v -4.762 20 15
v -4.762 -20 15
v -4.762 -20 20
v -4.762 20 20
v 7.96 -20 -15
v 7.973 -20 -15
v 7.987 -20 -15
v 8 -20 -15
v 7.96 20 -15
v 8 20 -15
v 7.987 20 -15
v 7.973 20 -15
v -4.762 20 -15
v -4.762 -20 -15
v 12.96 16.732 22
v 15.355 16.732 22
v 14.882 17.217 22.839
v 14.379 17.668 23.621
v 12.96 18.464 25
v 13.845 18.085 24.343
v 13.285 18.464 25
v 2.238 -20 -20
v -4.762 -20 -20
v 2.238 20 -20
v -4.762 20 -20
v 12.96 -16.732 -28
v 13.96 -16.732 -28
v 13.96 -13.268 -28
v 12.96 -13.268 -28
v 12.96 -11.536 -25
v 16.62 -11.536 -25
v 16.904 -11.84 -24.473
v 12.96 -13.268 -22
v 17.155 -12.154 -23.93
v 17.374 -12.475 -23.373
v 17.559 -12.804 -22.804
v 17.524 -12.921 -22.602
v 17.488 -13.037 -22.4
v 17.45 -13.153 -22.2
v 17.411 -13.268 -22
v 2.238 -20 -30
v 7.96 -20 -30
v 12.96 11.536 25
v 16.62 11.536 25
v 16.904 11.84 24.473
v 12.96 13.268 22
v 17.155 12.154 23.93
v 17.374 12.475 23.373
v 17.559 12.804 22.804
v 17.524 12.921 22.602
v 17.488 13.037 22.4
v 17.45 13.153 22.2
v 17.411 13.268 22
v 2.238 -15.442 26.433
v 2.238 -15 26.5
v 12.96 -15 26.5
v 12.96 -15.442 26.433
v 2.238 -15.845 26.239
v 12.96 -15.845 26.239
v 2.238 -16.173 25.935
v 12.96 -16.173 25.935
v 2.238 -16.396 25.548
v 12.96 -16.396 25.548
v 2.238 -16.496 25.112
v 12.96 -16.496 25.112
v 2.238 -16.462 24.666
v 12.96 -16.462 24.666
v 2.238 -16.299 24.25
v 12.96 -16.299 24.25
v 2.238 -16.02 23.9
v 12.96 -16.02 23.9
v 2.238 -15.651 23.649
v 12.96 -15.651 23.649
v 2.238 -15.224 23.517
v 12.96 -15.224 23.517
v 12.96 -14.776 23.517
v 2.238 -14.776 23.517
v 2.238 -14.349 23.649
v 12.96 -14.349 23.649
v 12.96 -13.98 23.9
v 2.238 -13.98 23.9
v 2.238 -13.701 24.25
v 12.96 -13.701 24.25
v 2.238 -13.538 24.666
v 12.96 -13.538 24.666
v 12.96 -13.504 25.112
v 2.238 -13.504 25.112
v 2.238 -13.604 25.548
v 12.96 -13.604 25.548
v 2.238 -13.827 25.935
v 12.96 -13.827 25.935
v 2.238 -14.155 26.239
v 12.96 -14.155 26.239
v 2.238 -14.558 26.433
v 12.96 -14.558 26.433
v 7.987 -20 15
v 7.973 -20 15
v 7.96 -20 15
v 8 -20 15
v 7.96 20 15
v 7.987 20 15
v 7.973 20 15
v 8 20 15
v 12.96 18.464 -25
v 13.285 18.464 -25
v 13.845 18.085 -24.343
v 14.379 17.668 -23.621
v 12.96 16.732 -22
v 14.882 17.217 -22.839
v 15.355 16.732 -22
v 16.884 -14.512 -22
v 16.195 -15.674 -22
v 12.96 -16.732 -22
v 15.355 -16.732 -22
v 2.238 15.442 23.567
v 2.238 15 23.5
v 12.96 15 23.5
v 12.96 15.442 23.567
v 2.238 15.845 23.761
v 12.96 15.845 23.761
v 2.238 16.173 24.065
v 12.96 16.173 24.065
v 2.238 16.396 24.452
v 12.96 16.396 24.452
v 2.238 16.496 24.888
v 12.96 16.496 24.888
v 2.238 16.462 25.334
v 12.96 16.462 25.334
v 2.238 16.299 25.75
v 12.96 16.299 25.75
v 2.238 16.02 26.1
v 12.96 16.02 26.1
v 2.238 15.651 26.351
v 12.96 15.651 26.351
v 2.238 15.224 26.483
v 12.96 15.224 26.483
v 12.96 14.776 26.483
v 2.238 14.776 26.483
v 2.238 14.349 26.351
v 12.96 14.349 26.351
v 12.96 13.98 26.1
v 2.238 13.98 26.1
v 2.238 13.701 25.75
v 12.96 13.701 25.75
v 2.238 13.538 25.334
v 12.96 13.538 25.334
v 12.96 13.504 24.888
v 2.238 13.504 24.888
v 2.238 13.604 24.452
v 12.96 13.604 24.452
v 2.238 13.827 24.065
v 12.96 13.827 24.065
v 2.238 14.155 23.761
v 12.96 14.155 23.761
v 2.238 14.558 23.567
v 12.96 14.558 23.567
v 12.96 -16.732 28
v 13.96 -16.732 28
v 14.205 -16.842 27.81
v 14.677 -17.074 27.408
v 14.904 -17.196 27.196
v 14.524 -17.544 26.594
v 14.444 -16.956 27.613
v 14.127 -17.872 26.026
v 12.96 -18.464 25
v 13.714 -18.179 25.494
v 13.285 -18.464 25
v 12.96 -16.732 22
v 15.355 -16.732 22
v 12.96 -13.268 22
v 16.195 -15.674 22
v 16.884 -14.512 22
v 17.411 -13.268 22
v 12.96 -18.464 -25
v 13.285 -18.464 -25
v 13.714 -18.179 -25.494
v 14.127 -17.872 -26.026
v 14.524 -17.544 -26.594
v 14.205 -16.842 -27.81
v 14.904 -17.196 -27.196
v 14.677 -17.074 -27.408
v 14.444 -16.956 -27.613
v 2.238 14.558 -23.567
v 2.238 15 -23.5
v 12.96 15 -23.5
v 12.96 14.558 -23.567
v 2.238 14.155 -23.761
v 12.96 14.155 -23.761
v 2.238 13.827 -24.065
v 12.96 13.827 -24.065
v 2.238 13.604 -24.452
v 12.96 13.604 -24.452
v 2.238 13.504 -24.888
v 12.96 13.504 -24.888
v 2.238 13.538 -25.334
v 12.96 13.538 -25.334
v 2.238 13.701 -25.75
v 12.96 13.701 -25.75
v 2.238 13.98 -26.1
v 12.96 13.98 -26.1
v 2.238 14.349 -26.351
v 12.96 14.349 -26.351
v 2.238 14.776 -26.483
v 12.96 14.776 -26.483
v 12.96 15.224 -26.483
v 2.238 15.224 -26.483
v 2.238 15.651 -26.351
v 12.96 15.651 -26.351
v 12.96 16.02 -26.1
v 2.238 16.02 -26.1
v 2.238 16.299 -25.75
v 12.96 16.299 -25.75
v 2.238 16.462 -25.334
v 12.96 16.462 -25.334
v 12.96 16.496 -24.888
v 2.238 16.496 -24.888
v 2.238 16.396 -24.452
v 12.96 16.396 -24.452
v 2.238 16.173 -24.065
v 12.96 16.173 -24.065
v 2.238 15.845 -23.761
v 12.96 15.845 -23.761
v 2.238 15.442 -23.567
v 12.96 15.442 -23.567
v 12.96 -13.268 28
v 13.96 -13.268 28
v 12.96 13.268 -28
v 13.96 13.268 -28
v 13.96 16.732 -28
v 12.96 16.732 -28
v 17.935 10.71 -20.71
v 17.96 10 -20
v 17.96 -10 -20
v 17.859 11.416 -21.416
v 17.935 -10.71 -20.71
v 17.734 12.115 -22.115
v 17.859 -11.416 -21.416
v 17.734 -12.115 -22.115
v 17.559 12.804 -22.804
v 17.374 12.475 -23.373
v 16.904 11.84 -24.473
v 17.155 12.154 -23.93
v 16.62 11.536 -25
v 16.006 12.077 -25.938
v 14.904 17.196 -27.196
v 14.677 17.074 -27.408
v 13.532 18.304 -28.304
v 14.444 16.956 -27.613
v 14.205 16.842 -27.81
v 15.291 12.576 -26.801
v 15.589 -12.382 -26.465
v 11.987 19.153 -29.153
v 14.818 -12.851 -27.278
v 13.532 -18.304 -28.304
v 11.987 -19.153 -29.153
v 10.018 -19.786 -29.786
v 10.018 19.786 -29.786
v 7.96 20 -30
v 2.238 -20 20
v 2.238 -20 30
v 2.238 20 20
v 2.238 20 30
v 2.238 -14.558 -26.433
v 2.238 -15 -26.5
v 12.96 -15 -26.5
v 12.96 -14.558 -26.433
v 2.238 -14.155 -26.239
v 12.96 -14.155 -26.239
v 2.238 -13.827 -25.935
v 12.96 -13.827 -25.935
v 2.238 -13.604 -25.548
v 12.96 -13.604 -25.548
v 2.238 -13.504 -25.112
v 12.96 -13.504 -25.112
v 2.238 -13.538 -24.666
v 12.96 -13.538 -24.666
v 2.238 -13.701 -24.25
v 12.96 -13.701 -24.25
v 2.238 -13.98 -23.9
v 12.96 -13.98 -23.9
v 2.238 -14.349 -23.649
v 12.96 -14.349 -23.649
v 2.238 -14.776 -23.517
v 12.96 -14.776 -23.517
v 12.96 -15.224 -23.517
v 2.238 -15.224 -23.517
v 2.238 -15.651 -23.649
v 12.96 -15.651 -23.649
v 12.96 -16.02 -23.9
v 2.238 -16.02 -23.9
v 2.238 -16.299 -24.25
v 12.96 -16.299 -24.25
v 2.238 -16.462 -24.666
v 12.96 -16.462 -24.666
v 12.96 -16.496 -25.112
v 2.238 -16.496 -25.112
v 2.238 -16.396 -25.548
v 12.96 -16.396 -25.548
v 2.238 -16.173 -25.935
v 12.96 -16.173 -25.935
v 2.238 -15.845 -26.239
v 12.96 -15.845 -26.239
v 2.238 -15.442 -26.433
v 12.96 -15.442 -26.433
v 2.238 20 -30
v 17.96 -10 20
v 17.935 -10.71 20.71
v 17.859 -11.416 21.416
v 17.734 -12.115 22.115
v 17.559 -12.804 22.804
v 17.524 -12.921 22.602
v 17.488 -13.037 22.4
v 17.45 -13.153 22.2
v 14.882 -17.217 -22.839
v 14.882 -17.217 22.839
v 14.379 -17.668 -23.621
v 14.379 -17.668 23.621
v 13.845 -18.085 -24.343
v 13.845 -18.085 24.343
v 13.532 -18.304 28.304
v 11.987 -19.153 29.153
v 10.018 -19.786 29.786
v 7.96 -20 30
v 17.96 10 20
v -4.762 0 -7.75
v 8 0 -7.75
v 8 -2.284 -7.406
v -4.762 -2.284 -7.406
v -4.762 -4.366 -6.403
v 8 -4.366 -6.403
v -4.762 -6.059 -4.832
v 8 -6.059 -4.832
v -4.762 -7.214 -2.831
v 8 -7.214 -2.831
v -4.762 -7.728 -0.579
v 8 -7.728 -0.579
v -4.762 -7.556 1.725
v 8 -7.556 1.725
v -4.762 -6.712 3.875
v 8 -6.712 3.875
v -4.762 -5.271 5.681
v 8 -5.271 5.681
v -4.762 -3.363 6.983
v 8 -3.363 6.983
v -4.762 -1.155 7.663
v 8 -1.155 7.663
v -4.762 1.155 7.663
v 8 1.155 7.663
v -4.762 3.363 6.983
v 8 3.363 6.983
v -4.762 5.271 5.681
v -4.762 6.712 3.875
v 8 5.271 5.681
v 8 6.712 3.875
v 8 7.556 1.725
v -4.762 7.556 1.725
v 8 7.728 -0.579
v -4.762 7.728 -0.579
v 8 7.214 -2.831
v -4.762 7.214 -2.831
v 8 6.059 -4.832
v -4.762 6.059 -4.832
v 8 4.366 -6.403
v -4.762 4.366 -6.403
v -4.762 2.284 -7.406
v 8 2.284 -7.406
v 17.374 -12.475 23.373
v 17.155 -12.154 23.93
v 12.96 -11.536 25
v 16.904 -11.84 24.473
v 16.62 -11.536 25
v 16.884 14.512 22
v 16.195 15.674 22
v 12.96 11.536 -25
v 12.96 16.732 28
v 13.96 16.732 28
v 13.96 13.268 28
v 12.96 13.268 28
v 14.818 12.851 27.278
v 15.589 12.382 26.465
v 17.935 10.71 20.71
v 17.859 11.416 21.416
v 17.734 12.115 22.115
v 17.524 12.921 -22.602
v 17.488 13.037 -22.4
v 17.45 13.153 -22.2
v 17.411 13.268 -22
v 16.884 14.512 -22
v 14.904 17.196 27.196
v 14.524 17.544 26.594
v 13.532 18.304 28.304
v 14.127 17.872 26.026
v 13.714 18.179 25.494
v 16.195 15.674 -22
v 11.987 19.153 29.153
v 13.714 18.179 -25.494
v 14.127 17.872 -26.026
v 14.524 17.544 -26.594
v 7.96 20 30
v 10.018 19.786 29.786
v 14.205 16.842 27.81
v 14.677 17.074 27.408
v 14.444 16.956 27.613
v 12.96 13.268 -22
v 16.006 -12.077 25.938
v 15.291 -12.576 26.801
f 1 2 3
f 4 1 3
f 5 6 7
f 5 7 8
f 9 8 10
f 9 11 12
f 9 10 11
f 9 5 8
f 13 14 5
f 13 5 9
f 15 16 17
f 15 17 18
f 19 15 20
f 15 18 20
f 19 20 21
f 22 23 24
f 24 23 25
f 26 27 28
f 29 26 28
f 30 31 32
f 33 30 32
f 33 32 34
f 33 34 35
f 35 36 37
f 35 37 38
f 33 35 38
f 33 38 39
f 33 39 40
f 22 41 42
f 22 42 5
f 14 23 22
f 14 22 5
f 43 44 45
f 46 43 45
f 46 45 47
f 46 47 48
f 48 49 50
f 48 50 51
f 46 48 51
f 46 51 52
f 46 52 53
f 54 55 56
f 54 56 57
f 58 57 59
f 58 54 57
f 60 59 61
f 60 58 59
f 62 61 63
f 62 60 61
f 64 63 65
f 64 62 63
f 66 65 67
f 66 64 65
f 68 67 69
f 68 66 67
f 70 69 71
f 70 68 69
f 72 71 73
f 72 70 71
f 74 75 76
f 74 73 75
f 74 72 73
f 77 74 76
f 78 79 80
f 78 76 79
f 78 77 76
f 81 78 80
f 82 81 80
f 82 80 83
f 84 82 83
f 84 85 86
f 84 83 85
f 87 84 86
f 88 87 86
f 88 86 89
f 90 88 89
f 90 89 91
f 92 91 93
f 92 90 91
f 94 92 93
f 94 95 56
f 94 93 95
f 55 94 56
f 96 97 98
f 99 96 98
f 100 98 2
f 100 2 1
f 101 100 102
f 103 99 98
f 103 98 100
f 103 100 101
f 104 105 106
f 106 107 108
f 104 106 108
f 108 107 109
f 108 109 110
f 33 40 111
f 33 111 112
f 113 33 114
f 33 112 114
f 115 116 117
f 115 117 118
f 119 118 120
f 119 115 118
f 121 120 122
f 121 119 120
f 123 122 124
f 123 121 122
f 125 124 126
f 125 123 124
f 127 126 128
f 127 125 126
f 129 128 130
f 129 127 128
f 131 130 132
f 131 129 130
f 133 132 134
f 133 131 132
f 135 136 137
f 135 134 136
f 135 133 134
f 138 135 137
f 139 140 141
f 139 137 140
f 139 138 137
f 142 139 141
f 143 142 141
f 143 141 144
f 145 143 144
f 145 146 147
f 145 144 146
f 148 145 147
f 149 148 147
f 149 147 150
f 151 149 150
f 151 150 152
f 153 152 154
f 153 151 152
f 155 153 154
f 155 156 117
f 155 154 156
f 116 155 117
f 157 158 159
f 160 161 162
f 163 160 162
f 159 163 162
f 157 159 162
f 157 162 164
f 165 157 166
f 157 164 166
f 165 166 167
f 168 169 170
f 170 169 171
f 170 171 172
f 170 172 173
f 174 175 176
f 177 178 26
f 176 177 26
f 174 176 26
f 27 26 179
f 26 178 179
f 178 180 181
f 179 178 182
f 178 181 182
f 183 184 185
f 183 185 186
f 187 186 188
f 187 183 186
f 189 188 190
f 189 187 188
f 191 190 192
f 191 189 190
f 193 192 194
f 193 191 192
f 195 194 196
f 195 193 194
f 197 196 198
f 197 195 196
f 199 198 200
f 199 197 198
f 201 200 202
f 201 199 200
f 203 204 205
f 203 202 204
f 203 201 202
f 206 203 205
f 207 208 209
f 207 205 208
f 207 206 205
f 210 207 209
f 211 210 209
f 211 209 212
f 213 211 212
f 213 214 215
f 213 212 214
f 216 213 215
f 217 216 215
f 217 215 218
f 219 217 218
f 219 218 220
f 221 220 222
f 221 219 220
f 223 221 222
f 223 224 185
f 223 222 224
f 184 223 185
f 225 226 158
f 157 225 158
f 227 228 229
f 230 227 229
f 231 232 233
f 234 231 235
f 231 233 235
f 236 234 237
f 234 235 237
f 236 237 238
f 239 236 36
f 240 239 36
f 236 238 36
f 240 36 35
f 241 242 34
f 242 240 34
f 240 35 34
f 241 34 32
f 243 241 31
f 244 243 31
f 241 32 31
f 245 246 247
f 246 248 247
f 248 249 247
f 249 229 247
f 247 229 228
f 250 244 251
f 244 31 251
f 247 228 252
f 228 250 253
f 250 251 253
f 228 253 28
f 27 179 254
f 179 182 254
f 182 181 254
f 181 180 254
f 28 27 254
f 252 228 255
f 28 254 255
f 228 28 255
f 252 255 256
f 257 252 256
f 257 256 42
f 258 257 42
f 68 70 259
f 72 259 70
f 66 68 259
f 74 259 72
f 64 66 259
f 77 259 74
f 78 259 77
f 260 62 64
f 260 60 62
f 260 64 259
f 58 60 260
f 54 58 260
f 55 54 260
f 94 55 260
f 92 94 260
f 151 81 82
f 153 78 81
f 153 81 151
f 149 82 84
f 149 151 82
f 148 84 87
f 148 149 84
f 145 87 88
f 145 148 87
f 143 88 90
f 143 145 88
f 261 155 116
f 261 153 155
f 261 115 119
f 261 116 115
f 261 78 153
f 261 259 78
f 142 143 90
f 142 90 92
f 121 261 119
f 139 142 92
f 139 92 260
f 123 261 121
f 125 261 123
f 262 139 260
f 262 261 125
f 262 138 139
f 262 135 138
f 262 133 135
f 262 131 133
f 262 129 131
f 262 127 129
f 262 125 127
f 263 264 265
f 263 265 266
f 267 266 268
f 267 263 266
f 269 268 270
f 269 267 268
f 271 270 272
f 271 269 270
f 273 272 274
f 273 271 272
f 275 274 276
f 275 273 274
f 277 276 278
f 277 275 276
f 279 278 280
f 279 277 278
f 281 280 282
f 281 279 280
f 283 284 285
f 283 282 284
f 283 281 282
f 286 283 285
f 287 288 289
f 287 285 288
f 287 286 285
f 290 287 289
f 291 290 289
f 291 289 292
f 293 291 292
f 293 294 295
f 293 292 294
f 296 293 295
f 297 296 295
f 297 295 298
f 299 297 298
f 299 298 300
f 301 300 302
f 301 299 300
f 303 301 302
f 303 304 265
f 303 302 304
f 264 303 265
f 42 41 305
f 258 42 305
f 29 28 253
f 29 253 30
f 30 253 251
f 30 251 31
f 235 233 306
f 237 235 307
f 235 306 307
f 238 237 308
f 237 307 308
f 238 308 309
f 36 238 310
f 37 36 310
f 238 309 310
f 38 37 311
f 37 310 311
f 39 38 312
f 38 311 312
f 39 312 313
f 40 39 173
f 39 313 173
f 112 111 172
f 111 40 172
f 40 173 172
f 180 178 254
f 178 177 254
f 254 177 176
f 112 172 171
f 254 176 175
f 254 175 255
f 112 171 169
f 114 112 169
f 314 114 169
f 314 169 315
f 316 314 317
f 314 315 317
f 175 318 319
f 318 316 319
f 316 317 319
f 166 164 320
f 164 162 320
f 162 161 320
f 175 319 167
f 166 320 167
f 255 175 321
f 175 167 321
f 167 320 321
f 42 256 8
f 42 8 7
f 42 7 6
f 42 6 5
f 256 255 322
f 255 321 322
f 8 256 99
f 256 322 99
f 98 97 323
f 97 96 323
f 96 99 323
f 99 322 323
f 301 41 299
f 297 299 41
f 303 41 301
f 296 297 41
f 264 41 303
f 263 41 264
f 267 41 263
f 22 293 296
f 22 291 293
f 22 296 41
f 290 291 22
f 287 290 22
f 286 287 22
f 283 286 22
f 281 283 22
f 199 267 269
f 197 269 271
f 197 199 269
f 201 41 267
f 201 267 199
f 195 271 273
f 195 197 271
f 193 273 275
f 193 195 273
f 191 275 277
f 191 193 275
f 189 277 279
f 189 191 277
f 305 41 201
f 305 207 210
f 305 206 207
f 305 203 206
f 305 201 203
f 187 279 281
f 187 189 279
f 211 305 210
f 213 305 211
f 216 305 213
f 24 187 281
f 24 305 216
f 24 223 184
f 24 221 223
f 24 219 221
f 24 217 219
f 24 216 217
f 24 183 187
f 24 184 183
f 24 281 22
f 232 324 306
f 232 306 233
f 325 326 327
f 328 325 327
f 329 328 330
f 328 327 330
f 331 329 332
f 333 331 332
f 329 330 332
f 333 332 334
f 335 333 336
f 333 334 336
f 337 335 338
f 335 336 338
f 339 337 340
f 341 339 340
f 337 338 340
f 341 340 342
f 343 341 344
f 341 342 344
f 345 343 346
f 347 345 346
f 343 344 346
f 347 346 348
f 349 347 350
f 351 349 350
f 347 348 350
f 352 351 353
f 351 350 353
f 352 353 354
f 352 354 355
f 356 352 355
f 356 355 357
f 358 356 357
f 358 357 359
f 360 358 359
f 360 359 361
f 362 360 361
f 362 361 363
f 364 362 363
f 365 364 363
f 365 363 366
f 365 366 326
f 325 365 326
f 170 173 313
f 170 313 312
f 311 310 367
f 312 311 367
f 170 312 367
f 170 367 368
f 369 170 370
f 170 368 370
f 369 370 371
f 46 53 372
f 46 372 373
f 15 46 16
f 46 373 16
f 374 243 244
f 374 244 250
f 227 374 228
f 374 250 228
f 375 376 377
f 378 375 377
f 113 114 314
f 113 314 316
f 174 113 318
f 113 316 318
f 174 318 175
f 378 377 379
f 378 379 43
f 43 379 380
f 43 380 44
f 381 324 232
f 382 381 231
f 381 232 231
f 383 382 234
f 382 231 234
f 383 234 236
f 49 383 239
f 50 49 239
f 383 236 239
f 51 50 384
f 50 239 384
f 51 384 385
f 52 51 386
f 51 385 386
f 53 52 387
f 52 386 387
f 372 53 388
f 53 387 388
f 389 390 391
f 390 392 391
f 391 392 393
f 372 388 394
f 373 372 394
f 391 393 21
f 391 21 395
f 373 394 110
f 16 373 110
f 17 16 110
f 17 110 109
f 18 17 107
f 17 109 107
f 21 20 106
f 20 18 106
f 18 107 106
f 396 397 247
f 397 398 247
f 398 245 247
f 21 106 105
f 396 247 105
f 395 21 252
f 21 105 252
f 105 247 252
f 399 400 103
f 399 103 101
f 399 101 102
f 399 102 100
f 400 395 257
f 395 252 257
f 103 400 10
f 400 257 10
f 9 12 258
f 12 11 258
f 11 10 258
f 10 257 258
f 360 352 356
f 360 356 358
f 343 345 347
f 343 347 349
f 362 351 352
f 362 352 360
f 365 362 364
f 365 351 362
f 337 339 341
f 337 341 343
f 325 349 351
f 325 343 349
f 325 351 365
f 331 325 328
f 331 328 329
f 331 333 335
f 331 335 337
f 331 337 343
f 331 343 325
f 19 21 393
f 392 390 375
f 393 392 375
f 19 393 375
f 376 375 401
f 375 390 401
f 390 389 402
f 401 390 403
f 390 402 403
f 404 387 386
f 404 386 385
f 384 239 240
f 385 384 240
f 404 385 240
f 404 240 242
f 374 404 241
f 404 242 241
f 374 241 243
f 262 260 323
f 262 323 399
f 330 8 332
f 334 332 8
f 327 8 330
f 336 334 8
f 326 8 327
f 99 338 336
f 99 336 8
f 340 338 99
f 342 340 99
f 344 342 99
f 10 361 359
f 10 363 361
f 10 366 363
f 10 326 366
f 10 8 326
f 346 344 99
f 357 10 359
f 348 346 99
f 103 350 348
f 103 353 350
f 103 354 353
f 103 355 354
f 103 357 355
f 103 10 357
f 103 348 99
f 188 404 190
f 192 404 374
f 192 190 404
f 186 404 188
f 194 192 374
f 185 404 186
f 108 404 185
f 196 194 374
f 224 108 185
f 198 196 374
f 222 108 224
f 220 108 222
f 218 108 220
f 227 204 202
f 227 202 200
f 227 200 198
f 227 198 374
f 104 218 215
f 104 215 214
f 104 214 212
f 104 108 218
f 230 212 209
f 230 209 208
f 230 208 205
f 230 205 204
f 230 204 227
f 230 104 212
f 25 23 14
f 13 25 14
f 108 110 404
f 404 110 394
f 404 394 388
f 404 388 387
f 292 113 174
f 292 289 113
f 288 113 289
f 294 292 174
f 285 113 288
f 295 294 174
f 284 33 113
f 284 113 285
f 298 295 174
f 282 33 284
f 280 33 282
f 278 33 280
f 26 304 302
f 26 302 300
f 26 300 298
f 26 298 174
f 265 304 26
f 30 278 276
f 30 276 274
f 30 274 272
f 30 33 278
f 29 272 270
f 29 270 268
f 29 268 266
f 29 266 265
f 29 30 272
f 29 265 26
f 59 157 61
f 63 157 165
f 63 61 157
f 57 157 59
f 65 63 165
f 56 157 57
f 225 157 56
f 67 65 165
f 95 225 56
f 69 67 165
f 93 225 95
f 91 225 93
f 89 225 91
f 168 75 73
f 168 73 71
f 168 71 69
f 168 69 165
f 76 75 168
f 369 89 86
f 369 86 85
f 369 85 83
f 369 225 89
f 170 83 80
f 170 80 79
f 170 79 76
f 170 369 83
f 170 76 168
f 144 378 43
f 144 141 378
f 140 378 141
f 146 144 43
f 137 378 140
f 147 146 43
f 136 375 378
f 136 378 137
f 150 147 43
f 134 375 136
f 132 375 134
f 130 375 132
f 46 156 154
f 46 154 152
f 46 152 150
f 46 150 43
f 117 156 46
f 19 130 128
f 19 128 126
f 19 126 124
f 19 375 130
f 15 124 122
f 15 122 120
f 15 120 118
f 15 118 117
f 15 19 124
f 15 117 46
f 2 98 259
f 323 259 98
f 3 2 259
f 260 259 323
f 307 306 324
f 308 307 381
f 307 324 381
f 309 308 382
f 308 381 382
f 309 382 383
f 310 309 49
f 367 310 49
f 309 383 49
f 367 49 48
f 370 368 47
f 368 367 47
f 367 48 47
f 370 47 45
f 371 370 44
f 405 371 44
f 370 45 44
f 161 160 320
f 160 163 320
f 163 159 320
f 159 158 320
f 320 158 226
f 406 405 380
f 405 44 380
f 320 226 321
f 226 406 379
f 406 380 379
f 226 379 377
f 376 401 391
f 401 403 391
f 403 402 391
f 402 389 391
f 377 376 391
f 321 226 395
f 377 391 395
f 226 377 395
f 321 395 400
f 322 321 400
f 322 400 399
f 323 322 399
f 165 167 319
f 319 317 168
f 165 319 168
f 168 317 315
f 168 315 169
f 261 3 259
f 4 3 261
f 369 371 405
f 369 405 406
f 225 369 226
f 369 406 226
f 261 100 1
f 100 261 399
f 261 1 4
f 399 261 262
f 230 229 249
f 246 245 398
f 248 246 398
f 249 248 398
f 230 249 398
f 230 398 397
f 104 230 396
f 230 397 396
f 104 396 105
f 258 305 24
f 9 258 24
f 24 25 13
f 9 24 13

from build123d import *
from build123d.topology import SkipClean

# Parameters (mm, degrees)
CROQUIS1_W              = 60
CROQUIS1_H              = 40
CROQUIS1_R              = 1.5
SALIENTE_EXTRUIR1_DEPTH = 17.96
SALIENTE_EXTRUIR2_START = 4.7625
CROQUIS3_W              = 15
CROQUIS3_H              = 40
CROQUIS3_R              = 1.5
SALIENTE_EXTRUIR2_DEPTH = 4.7625
CROQUIS4_R              = 7.75
SALIENTE_EXTRUIR3_DEPTH = 4.7625
REDONDEO2_R             = 10
CORTAR_EXTRUIR1_DEPTH   = 5
CROQUIS6_W              = 10
CROQUIS6_H              = 40
CORTAR_EXTRUIR2_DEPTH   = 7
CORTAR_EXTRUIR3_START   = -8
CROQUIS7_W              = 30
CROQUIS7_H              = 40
CROQUIS7_R              = 7.75
CORTAR_EXTRUIR3_DEPTH   = 8


with BuildPart() as part:
    # Croquis1 → Saliente-Extruir1 (new body)
    with BuildSketch(Plane(origin=(0, 0, 0), x_dir=(0, 0, -1), z_dir=(1, 0, 0))):
        Rectangle(CROQUIS1_W, CROQUIS1_H)
        with Locations((-25, 15)):
            Circle(CROQUIS1_R, mode=Mode.SUBTRACT)
        with Locations(Location((25, 15, 0), (0, 0, 180))):
            Circle(CROQUIS1_R, mode=Mode.SUBTRACT)
        with Locations((25, -15)):
            Circle(CROQUIS1_R, mode=Mode.SUBTRACT)
        with Locations(Location((-25, -15, 0), (0, 0, 180))):
            Circle(CROQUIS1_R, mode=Mode.SUBTRACT)
    extrude(amount=SALIENTE_EXTRUIR1_DEPTH)

    # Croquis3 → Saliente-Extruir2 (add)
    # profile 1 of 2: a face of its own
    with SkipClean():  # the faces are left unmerged after this step: merging them gives an invalid solid
        with BuildSketch(Plane.ZY.offset(SALIENTE_EXTRUIR2_START)):
            with Locations((-22.5, 0)):
                Rectangle(CROQUIS3_W, CROQUIS3_H)
            with Locations((-25, -15)):
                Circle(CROQUIS3_R, mode=Mode.SUBTRACT)
            with Locations((-25, 15)):
                Circle(CROQUIS3_R, mode=Mode.SUBTRACT)
        # profile 2 of 2: a face of its own
        with BuildSketch(Plane.ZY.offset(SALIENTE_EXTRUIR2_START)):
            with Locations((22.5, 0)):
                Rectangle(CROQUIS3_W, CROQUIS3_H)
            with Locations((25, -15)):
                Circle(CROQUIS3_R, mode=Mode.SUBTRACT)
            with Locations((25, 15)):
                Circle(CROQUIS3_R, mode=Mode.SUBTRACT)
        extrude(amount=-SALIENTE_EXTRUIR2_DEPTH)

    # Croquis4 → Saliente-Extruir3 (add)
    with SkipClean():  # the faces are left unmerged after this step: merging them gives an invalid solid
        with BuildSketch(Plane.ZY):
            with Locations(Location((0, 0, 0), (0, 0, 180))):
                Circle(CROQUIS4_R)
        extrude(amount=SALIENTE_EXTRUIR3_DEPTH)

    # Redondeo2
    # the kernel refuses this fillet: 10 mm, written as the material it takes off along each edge
    with BuildSketch(Plane(origin=(17.96, -45, -30), x_dir=(-1, 0, 0), z_dir=(0, 1, 0)), Plane(origin=(17.96, 45, 30), x_dir=(-1, 0, 0), z_dir=(0, -1, 0))) as redondeo2_piece_1:
        with BuildLine():
            CenterArc((REDONDEO2_R, REDONDEO2_R), REDONDEO2_R, 180, 90)
            Line((0, REDONDEO2_R), (0, 0))
            Line((0, 0), (REDONDEO2_R, 0))
        make_face()
    extrude(amount=90, mode=Mode.SUBTRACT)
    with BuildSketch(Plane(origin=(17.96, 20, -55), x_dir=(0, -1, 0), z_dir=(0, 0, 1))) as redondeo2_piece_2:
        with BuildLine():
            CenterArc((REDONDEO2_R, -REDONDEO2_R), REDONDEO2_R, 90, 90)
            Line((0, -REDONDEO2_R), (0, 0))
            Line((0, 0), (REDONDEO2_R, 0))
        make_face()
    extrude(amount=110, mode=Mode.SUBTRACT)
    with BuildSketch(Plane(origin=(17.96, -20, 55), x_dir=(-1, 0, 0), z_dir=(0, 0, -1))) as redondeo2_piece_3:
        with BuildLine():
            CenterArc((REDONDEO2_R, REDONDEO2_R), REDONDEO2_R, 180, 90)
            Line((0, REDONDEO2_R), (0, 0))
            Line((0, 0), (REDONDEO2_R, 0))
        make_face()
    extrude(amount=110, mode=Mode.SUBTRACT)

    # Croquis5 → Cortar-Extruir1 (cut)
    with BuildSketch(Plane(origin=(17.96, 0, 0), x_dir=(0, 0, -1), z_dir=(1, 0, 0))):
        Polygon((-25, 18.464101615), (-28, 16.732050808), (-28, 13.267949192), (-25, 11.535898385), (-22, 13.267949192), (-22, 16.732050808), align=None)
        Polygon((25, 18.464101615), (22, 16.732050808), (22, 13.267949192), (25, 11.535898385), (28, 13.267949192), (28, 16.732050808), align=None)
        Polygon((25, -18.464101615), (28, -16.732050808), (28, -13.267949192), (25, -11.535898385), (22, -13.267949192), (22, -16.732050808), align=None)
        Polygon((-25, -18.464101615), (-22, -16.732050808), (-22, -13.267949192), (-25, -11.535898385), (-28, -13.267949192), (-28, -16.732050808), align=None)
    extrude(amount=-CORTAR_EXTRUIR1_DEPTH, mode=Mode.SUBTRACT)

    # Croquis6 → Cortar-Extruir2 (cut)
    with BuildSketch(Plane.ZY.offset(4.7625)):
        with Locations((25, 0)):
            Rectangle(CROQUIS6_W, CROQUIS6_H)
        with Locations((-25, 0)):
            Rectangle(CROQUIS6_W, CROQUIS6_H)
    extrude(amount=-CORTAR_EXTRUIR2_DEPTH, mode=Mode.SUBTRACT)

    # Croquis7 → Cortar-Extruir3 (cut)
    with BuildSketch(Plane.ZY.offset(CORTAR_EXTRUIR3_START)):
        Rectangle(CROQUIS7_W, CROQUIS7_H)
        with Locations(Location((0, 0, 0), (0, 0, 180))):
            Circle(CROQUIS7_R, mode=Mode.SUBTRACT)
    extrude(amount=CORTAR_EXTRUIR3_DEPTH, mode=Mode.SUBTRACT)


solid = part.part
